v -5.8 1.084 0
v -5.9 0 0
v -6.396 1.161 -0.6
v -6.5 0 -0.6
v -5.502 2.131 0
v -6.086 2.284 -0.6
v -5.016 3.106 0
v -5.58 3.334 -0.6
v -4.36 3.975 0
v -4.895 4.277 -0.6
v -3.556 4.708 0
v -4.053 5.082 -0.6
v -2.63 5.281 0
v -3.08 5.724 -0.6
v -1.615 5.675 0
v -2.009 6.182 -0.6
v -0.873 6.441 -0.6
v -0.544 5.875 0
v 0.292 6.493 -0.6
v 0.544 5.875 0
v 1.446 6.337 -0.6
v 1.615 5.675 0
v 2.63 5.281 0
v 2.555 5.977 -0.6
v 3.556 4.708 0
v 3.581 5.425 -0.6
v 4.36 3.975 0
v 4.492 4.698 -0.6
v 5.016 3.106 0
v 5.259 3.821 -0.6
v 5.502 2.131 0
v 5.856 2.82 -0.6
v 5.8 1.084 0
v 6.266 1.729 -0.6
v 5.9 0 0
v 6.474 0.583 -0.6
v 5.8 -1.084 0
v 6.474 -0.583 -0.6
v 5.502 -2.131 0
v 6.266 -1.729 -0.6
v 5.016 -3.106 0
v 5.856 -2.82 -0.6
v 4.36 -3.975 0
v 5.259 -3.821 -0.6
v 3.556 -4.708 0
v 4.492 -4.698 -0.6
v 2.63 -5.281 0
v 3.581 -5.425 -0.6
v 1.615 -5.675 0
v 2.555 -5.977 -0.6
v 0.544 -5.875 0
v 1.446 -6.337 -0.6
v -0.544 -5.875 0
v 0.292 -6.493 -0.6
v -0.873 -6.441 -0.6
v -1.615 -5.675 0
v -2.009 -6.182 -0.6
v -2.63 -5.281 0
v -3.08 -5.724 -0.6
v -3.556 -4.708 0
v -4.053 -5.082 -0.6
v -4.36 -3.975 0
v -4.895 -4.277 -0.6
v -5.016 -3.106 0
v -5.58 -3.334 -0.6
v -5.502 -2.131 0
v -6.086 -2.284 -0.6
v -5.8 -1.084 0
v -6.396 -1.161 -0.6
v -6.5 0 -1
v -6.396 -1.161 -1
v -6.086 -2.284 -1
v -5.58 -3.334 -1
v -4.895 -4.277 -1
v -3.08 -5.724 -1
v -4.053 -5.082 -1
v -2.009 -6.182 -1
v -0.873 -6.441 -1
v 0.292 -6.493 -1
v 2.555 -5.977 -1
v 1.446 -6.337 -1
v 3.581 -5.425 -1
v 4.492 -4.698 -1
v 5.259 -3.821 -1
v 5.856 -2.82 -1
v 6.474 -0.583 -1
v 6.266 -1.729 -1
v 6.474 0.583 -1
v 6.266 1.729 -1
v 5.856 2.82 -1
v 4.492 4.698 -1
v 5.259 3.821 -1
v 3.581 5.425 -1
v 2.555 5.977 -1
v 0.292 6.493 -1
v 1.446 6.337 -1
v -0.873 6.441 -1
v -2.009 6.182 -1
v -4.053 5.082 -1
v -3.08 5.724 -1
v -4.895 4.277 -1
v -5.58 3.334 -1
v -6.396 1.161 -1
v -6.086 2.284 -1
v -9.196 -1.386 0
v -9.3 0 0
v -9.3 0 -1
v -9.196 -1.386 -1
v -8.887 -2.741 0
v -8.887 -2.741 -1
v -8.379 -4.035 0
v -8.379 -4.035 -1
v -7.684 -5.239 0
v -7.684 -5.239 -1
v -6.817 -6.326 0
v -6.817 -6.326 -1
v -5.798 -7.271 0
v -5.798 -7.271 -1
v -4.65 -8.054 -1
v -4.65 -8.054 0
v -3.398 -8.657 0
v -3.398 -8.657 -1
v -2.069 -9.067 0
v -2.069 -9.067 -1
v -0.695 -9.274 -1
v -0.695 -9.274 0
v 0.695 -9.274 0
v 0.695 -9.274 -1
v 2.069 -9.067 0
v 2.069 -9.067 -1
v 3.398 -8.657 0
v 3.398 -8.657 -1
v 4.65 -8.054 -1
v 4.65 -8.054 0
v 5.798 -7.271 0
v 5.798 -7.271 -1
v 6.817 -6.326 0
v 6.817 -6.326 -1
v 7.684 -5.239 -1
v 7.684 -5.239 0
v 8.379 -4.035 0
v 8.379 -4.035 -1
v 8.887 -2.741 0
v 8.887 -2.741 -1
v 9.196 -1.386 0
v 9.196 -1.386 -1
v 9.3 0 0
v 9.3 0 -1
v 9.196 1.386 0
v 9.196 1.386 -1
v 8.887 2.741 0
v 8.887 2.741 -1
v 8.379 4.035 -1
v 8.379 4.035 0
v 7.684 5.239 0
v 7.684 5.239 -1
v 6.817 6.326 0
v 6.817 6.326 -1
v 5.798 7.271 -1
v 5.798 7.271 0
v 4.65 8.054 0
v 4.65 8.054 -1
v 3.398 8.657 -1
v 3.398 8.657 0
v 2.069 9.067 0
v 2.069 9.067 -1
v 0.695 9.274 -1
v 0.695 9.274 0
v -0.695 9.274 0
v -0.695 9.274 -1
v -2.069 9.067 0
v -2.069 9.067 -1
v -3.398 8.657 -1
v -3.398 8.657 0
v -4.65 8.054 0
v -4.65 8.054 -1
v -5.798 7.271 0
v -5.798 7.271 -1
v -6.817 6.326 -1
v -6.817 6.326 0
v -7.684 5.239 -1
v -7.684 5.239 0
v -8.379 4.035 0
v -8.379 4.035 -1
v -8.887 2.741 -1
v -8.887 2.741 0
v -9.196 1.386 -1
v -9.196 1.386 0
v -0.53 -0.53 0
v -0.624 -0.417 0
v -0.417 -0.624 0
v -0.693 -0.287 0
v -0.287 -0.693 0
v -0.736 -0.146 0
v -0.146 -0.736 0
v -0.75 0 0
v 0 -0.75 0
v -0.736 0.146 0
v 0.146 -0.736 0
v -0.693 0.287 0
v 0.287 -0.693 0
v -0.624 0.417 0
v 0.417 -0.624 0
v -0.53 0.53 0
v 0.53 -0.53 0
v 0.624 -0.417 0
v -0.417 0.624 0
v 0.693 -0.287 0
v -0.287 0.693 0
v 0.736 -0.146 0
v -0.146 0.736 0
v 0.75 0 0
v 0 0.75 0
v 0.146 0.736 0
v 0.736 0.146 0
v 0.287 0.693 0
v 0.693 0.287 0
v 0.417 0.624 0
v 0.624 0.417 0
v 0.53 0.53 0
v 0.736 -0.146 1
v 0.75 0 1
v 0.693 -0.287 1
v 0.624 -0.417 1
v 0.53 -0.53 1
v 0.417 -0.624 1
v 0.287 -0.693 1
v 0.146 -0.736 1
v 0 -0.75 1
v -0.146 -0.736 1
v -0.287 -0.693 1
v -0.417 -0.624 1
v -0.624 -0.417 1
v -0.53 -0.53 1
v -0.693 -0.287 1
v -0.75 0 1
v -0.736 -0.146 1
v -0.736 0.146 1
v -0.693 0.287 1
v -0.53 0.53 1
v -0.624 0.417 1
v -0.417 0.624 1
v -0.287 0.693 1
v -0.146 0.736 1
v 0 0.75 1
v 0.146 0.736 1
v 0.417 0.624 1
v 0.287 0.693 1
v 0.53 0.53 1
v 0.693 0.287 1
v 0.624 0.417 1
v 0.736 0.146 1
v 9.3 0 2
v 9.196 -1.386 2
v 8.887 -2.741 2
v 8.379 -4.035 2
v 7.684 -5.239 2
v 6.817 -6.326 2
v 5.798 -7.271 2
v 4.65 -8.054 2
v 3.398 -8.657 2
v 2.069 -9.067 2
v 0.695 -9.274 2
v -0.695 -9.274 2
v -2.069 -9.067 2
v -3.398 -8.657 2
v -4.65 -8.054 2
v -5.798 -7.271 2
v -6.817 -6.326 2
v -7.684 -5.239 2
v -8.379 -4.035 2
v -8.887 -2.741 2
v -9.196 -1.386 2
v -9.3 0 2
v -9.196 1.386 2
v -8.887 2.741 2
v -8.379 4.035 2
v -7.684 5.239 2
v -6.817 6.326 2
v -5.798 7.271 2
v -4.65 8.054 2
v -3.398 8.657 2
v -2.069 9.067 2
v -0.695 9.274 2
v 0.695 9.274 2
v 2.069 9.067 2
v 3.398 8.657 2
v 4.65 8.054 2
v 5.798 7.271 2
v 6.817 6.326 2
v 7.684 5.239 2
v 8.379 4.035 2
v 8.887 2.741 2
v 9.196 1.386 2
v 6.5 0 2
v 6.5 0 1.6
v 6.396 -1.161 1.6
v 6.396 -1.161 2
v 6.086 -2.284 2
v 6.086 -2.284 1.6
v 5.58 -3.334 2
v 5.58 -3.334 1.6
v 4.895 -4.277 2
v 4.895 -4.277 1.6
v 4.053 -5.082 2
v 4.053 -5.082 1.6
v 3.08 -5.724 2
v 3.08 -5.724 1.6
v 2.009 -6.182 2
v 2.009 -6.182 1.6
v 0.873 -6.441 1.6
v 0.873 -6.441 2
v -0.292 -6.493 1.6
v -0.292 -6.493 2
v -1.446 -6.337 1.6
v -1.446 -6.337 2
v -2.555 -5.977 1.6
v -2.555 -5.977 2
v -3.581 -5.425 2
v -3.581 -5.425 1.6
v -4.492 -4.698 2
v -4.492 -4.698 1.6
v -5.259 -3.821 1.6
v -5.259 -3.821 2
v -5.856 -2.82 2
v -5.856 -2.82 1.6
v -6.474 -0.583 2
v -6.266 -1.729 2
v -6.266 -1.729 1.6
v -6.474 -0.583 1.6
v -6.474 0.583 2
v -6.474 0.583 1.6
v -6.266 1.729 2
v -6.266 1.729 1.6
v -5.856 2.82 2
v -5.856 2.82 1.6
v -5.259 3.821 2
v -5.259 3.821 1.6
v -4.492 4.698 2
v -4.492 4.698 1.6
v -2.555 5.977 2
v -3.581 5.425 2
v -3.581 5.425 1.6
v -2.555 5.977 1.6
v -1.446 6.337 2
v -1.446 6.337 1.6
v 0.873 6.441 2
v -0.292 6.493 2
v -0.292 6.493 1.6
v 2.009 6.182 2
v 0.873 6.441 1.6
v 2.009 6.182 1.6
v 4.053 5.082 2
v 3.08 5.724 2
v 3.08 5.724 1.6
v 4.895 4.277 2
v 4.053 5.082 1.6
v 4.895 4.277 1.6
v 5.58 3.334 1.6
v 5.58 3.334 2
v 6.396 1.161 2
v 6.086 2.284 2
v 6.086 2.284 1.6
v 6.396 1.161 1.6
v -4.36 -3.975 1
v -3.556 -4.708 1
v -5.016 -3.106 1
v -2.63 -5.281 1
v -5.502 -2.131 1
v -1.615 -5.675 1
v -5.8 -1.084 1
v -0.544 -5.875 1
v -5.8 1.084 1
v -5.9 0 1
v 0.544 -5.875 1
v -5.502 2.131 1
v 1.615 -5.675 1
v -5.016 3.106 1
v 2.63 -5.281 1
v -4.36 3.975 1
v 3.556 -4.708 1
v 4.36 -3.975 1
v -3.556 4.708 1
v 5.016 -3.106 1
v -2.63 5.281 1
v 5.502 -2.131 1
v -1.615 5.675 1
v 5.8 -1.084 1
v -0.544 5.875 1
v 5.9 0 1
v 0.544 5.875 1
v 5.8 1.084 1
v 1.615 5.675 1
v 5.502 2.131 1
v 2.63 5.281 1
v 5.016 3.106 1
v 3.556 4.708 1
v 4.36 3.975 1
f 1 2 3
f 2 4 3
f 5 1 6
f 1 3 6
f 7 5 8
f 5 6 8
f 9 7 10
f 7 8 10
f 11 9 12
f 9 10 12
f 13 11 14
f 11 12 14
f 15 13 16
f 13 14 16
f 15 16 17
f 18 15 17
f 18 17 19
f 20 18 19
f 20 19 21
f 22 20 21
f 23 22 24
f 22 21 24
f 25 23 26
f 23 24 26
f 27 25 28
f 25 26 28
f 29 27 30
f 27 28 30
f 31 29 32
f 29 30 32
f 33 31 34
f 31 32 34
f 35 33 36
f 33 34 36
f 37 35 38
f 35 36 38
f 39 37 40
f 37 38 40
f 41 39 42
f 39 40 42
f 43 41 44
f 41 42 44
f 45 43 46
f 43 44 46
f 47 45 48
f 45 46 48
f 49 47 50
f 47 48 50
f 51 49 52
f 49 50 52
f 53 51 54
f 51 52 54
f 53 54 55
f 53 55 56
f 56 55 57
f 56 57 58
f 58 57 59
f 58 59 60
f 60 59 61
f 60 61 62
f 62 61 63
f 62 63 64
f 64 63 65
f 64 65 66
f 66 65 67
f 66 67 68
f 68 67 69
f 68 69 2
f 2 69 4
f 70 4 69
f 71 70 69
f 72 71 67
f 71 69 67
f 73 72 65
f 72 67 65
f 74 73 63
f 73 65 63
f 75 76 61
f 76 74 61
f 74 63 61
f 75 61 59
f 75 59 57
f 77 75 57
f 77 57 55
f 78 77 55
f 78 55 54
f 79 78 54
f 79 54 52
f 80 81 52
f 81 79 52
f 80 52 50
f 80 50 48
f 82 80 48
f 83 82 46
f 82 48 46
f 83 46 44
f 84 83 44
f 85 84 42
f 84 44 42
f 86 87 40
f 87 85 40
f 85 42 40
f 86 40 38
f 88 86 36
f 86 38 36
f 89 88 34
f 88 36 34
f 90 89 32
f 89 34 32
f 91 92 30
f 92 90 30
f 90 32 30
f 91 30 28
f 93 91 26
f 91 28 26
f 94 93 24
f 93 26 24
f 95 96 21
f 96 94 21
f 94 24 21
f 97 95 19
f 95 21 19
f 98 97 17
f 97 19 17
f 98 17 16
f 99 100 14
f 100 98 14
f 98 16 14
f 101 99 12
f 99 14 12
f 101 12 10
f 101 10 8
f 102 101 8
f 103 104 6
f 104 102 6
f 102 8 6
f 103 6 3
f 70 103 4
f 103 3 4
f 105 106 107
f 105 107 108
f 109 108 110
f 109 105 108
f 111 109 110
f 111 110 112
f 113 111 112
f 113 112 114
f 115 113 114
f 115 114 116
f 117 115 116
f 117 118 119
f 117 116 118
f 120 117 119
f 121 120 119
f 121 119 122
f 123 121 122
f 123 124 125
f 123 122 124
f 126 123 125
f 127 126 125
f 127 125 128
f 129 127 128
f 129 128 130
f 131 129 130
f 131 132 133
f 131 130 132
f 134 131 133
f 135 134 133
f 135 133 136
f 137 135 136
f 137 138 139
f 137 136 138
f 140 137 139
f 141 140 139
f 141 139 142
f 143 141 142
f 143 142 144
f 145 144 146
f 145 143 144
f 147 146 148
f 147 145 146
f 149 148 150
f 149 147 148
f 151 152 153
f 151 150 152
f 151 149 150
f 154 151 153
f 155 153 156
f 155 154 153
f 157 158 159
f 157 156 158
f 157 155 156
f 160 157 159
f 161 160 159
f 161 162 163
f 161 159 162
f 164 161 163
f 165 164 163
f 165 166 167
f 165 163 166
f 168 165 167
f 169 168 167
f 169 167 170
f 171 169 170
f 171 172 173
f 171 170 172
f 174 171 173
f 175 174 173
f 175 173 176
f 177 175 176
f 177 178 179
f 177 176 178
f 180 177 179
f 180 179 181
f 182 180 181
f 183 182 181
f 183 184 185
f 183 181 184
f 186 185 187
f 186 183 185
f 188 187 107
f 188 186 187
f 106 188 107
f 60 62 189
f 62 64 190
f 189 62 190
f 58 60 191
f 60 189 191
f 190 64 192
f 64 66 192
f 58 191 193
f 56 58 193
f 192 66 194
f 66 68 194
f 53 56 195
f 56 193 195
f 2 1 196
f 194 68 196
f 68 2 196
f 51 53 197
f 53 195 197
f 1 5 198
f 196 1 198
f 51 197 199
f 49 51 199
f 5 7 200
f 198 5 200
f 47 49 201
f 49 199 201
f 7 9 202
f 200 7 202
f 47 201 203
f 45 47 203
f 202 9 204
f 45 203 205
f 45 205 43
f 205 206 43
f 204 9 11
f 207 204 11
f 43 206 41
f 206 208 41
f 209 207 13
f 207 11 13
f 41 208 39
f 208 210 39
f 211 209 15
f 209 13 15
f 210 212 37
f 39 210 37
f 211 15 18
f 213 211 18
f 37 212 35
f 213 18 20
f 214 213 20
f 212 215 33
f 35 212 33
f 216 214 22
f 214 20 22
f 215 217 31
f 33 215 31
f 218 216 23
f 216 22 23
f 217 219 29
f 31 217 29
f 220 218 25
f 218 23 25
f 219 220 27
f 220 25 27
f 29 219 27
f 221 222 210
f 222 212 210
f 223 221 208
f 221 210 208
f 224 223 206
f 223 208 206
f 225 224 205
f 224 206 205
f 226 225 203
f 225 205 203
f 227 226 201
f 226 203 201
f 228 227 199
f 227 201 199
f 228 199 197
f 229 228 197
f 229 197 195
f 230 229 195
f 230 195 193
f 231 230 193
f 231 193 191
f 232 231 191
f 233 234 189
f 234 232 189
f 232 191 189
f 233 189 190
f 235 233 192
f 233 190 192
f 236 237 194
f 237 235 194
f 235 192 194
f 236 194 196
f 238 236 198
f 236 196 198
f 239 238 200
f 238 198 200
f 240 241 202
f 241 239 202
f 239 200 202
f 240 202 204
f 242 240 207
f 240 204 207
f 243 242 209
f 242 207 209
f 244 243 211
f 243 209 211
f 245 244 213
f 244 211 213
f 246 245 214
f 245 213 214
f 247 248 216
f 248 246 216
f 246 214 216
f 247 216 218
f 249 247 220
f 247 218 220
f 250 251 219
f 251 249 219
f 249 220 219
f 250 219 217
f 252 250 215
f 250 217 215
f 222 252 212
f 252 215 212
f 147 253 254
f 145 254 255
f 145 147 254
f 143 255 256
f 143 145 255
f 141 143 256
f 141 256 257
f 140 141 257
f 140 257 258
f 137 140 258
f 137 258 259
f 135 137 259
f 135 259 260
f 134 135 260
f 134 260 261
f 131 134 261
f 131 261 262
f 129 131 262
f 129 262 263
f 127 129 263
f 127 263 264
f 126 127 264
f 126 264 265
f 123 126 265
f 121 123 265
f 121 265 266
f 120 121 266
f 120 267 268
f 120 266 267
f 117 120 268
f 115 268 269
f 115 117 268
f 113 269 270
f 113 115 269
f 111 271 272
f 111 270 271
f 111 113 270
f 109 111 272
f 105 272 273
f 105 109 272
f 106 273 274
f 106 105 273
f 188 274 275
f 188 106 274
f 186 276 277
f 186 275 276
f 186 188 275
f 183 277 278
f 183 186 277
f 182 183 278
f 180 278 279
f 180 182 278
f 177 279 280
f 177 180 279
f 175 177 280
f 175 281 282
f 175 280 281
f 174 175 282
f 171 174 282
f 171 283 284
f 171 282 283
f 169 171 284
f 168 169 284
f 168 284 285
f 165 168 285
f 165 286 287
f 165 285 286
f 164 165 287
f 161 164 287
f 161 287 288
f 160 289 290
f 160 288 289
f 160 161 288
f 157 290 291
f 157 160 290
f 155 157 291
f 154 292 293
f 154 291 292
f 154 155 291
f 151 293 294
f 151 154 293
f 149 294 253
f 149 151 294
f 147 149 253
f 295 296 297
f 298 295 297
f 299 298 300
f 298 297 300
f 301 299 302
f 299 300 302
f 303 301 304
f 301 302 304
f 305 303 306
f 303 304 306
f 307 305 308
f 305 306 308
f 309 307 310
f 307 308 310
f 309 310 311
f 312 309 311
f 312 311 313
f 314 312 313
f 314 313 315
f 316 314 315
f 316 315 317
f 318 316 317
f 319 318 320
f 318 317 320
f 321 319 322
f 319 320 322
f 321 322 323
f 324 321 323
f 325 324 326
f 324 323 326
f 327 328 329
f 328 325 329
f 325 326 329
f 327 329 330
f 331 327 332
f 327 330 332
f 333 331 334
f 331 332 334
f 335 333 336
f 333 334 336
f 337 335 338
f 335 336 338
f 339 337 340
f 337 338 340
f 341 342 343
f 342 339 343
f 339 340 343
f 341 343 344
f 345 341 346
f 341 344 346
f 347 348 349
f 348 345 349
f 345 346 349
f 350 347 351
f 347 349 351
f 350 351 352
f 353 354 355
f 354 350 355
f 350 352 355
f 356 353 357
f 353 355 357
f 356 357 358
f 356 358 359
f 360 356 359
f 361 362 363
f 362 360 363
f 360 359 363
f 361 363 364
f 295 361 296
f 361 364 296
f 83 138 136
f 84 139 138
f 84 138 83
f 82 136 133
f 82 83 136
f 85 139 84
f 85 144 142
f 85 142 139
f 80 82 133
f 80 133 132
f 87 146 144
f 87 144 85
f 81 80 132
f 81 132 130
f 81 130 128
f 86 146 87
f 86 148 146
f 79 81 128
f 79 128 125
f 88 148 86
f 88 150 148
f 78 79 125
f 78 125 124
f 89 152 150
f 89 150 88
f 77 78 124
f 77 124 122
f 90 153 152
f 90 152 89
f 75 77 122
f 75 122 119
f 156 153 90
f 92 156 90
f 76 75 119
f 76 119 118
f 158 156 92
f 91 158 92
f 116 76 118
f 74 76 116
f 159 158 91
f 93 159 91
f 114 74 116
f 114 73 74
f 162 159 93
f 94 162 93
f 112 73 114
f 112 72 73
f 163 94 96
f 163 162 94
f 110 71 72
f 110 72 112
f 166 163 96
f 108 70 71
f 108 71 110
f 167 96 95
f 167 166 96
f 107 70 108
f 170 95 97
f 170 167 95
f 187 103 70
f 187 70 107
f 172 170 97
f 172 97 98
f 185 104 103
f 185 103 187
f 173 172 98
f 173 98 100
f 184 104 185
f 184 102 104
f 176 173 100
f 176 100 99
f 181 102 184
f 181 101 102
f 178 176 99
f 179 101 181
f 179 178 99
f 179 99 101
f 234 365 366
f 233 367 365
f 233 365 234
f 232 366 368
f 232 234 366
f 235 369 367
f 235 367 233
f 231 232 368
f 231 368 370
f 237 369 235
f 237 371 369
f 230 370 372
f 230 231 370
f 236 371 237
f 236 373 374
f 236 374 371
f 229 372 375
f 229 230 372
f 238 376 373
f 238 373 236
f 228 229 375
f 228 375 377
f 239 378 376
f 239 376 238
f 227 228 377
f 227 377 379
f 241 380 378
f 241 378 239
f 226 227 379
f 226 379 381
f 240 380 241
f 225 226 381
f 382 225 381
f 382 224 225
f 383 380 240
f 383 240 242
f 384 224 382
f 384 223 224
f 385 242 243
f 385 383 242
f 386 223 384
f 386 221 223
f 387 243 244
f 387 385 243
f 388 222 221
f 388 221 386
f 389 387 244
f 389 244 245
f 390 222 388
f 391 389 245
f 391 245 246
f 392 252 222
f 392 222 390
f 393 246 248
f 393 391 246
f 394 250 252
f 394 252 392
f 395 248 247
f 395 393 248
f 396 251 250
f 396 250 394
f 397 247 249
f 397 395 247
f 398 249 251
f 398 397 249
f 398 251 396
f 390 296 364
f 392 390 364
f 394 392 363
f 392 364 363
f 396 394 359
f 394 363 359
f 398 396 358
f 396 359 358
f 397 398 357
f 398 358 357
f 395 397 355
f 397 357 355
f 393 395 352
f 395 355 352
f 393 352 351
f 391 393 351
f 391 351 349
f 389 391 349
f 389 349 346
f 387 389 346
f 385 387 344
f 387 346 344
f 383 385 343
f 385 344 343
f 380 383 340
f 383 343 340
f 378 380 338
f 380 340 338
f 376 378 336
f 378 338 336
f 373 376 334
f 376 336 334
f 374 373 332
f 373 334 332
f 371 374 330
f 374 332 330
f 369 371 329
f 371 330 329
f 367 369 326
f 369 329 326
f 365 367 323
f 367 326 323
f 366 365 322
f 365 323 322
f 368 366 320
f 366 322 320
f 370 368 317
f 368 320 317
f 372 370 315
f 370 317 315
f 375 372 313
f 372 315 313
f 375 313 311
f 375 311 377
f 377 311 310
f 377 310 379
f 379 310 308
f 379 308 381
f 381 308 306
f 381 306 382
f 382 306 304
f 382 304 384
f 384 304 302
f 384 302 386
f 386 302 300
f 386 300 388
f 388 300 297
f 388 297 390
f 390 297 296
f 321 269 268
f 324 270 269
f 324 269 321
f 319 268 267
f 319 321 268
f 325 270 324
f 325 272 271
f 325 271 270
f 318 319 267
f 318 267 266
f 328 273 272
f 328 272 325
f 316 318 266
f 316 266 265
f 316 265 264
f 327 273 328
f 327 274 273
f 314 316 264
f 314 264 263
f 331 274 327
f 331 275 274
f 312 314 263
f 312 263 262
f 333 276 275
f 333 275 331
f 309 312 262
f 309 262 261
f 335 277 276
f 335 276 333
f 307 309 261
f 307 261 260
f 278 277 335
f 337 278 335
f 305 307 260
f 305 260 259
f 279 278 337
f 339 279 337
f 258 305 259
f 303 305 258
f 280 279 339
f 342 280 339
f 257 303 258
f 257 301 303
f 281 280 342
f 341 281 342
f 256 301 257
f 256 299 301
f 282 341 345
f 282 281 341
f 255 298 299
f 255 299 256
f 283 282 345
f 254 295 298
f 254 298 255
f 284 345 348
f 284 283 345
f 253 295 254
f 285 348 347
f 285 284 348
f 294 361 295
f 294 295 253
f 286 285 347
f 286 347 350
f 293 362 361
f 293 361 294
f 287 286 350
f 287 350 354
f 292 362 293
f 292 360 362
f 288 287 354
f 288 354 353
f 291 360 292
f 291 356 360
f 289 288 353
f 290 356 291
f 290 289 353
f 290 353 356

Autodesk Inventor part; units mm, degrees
ref_plane "YZ Plane" through (0, 0, 0) normal (1, 0, 0) x (0, 1, 0)
ref_plane "XZ Plane" through (0, 0, 0) normal (0, 1, 0) x (-1, 0, 0)
ref_plane "XY Plane" through (0, 0, 0) normal (0, 0, 1) x (1, 0, 0)
sketch "スケッチ1" plane through (0, 0, 0) normal (0, 0, 1) x (1, 0, 0)
  circle A0 centre (0, 0) radius 9.3
  circle A1 centre (0, 0) radius 0.75
  dimension "d0" = 18.6
  dimension "d1" = 1.5
extrude "押し出し1" add sketch "スケッチ1" along normal blind 1
sketch "スケッチ2" plane through (0, 0, 1) normal (0, 0, 1) x (1, 0, 0)
  circle A0 centre (0, 0) radius 0.75 projected
  circle A1 centre (0, 0) radius 9.3 projected
  circle A2 centre (0, 0) radius 6.5
  dimension "d4" = 13
extrude "押し出し2" add sketch "スケッチ2" along normal blind 1 contours A1
sketch "スケッチ3" plane through (0, 0, 0) normal (0, 0, -1) x (-1, 0, 0)
  circle A0 centre (0, 0) radius 6.5 projected
  circle A1 centre (0, 0) radius 0.75 projected
  circle A2 centre (0, 0) radius 9.3 projected
extrude "押し出し3" add sketch "スケッチ3" along normal blind 1 contours A2
chamfer "面取り1" distance 0.6 angle 45 2 edges at (6.5, 0, 0) (-6.5, 0, 1)
properties part number "RescueKitThrow_springholder"
